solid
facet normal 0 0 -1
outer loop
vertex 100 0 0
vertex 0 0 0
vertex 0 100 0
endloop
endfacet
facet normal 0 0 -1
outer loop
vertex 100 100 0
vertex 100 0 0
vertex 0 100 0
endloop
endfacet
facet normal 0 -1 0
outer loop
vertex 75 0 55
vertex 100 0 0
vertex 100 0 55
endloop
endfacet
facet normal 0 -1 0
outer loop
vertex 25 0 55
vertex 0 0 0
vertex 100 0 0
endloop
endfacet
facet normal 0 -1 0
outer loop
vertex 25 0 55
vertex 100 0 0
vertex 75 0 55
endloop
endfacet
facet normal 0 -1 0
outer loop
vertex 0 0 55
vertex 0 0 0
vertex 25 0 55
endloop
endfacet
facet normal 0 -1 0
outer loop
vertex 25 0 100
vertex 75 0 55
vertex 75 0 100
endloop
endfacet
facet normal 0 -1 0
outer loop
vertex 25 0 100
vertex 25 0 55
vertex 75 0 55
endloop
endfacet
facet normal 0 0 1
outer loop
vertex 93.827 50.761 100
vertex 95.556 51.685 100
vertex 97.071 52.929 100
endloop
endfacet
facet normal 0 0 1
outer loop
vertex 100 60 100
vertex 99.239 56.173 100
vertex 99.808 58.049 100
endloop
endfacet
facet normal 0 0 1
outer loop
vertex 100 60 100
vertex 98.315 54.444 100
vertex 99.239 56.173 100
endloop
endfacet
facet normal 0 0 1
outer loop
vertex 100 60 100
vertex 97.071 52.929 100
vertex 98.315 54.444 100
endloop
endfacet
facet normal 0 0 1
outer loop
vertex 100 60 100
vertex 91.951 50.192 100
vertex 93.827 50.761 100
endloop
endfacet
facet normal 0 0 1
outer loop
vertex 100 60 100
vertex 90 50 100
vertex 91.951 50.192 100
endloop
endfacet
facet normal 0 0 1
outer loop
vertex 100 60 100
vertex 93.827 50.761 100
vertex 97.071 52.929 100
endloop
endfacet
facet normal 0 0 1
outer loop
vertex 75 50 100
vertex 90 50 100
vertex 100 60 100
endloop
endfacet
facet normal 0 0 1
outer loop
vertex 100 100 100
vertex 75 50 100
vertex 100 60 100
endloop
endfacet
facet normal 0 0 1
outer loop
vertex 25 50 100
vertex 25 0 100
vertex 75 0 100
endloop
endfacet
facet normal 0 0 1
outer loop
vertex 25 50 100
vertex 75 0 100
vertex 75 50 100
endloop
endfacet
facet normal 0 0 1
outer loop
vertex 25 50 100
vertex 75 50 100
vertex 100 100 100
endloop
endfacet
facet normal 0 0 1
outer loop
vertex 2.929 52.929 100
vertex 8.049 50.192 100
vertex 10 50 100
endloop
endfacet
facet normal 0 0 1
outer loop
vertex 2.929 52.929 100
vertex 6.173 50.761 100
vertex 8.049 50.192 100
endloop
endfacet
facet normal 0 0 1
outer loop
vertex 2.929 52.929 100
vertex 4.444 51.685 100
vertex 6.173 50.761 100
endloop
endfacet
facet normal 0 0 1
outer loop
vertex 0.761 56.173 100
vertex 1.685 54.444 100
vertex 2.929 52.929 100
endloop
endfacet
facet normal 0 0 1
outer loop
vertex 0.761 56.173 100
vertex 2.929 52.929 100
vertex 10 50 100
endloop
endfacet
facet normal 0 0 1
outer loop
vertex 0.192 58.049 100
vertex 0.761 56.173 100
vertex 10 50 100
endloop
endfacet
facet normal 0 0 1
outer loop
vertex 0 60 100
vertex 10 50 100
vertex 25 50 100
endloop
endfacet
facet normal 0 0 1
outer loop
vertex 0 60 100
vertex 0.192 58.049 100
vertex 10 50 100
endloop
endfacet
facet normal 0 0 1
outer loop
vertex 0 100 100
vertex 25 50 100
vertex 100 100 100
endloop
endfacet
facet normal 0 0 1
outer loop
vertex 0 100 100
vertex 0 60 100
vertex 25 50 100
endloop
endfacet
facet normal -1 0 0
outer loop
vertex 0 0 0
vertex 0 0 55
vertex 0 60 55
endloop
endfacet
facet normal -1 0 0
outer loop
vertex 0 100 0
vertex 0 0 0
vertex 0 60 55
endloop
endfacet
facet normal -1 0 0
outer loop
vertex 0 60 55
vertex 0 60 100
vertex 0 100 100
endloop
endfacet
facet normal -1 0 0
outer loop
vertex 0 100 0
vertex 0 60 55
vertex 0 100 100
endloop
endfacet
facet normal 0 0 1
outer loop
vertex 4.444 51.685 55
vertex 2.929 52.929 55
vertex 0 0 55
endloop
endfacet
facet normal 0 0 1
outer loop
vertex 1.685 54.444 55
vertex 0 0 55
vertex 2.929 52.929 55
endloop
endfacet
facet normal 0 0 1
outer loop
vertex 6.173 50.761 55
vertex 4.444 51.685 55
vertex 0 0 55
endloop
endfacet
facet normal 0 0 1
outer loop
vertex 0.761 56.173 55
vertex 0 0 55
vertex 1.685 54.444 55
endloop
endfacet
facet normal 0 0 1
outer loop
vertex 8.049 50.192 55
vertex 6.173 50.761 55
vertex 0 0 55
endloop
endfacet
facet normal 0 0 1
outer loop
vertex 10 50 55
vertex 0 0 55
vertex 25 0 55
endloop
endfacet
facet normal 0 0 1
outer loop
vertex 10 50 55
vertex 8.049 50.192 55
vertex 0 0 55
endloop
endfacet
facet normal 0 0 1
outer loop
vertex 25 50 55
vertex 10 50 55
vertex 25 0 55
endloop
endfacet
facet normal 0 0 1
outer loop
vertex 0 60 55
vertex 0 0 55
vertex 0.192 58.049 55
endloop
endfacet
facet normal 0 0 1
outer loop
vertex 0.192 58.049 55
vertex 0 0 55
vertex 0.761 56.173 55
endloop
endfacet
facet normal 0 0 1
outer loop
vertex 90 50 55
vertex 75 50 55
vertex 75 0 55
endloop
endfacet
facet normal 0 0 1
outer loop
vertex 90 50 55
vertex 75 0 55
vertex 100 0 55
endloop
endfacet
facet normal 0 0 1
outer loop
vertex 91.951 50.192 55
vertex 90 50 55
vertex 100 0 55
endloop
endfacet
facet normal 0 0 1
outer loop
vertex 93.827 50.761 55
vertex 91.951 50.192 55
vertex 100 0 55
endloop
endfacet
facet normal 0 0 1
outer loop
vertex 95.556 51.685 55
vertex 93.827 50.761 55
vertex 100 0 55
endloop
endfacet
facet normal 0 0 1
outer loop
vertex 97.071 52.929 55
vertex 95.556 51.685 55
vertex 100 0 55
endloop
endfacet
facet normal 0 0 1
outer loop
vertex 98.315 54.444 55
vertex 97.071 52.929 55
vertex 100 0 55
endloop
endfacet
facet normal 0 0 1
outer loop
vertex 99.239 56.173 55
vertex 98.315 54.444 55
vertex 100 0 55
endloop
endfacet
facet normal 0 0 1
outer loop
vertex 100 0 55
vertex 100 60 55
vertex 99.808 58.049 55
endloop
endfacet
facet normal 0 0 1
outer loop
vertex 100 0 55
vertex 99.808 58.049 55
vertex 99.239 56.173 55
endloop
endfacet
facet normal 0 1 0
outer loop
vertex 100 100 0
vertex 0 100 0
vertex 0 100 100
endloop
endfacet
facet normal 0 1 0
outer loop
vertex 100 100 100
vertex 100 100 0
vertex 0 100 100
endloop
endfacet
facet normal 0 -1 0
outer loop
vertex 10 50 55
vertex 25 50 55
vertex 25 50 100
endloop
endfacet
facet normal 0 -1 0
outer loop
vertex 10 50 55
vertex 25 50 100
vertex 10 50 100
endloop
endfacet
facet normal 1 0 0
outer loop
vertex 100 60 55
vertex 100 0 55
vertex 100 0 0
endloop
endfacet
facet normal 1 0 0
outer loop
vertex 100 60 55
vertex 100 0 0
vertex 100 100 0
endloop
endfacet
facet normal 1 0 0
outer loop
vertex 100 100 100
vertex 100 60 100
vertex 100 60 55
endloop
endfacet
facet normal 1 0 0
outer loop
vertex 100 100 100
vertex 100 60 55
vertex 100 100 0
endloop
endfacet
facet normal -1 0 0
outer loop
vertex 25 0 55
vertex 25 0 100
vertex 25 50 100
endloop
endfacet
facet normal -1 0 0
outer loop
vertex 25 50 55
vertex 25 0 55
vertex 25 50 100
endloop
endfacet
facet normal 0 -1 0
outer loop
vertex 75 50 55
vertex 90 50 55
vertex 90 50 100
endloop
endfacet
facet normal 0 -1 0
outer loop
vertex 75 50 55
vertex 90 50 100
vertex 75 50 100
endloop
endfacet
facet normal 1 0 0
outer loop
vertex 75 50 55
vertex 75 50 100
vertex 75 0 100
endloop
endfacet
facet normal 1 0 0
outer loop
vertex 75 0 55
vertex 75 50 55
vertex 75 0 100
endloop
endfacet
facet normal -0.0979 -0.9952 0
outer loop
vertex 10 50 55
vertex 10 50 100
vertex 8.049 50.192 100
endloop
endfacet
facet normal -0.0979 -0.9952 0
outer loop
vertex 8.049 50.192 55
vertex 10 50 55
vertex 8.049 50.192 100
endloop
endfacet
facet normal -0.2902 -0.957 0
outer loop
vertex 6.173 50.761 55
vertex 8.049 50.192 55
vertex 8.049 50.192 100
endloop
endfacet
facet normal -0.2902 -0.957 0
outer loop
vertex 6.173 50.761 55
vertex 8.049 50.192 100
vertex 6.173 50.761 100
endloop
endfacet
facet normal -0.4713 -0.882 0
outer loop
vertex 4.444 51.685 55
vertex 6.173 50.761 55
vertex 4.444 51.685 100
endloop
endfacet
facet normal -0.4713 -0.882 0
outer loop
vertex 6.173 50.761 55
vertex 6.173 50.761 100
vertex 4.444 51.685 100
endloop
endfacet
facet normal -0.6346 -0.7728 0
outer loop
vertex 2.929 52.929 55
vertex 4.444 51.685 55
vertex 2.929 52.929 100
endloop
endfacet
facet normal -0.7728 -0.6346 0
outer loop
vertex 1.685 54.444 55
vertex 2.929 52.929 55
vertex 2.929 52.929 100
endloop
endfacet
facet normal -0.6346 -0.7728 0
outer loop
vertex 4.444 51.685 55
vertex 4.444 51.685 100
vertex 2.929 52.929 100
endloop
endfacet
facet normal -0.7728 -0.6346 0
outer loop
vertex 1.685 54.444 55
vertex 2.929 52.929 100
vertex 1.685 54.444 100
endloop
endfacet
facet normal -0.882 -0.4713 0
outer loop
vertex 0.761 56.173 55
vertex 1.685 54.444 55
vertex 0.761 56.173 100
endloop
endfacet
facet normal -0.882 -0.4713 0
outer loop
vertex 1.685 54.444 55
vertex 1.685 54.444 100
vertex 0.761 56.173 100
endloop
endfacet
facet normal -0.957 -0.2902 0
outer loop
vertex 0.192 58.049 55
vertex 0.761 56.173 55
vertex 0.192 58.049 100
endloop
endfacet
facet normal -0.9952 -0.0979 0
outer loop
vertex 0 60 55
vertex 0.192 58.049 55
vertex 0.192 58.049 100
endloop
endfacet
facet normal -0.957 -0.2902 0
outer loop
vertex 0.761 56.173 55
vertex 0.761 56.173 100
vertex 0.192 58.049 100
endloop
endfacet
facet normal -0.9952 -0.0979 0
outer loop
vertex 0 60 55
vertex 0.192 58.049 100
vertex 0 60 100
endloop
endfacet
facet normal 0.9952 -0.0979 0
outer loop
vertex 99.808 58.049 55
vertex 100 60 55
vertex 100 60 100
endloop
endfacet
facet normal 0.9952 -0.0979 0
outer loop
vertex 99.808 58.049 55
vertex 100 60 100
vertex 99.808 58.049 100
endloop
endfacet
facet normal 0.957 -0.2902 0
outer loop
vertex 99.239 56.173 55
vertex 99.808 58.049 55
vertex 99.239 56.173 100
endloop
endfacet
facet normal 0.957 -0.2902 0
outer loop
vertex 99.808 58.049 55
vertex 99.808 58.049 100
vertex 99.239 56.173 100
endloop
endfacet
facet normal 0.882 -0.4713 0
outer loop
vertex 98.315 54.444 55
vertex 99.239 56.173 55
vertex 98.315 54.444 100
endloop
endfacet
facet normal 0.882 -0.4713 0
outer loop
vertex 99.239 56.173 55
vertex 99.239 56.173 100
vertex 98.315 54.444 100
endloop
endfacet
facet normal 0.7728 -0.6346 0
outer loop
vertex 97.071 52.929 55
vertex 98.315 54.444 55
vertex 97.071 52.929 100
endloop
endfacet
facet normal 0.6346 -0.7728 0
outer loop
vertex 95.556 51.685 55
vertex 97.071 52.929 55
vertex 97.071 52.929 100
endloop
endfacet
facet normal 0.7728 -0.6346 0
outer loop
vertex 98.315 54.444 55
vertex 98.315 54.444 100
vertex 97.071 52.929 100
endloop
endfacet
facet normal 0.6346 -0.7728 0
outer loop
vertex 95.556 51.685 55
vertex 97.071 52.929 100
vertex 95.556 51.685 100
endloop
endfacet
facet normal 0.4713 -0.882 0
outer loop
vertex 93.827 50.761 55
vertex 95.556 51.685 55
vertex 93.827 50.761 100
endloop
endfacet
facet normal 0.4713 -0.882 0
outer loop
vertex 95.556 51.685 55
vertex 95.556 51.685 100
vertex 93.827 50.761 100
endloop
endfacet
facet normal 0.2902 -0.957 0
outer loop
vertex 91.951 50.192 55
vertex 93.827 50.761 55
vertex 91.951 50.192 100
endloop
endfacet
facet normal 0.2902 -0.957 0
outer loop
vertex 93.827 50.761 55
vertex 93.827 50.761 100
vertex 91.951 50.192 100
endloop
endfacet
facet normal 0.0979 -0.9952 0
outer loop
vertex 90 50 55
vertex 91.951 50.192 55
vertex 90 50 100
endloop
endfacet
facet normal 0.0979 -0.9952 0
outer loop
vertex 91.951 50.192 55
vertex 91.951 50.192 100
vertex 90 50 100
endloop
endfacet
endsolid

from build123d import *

# Parameters (mm, degrees)
F0_W     = 100
F0_H     = 100
F1_DEPTH = 100
F3_DEPTH = 45


with BuildPart() as f1:
    # F0 (on Right) → F1 (new body)
    with BuildSketch(Plane.YZ):
        with Locations((50, 50)):
            Rectangle(F0_W, F0_H)
    extrude(amount=F1_DEPTH)

    # F2 (on face) → F3 (cut)
    with BuildSketch(Plane.XY.offset(100)):
        with BuildLine():
            ThreePointArc((10, 50), (2.928932, 52.928932), (0, 60))
            Line((0, 60), (0, 0))
            Line((0, 0), (25, 0))
            Line((25, 0), (25, 50))
            Line((25, 50), (10, 50))
        make_face()
        with BuildLine():
            Line((100, 0), (100, 60))
            ThreePointArc((100, 60), (97.071068, 52.928932), (90, 50))
            Line((90, 50), (75, 50))
            Line((75, 50), (75, 0))
            Line((75, 0), (100, 0))
        make_face()
    extrude(amount=-F3_DEPTH, mode=Mode.SUBTRACT)


solid = f1.part
